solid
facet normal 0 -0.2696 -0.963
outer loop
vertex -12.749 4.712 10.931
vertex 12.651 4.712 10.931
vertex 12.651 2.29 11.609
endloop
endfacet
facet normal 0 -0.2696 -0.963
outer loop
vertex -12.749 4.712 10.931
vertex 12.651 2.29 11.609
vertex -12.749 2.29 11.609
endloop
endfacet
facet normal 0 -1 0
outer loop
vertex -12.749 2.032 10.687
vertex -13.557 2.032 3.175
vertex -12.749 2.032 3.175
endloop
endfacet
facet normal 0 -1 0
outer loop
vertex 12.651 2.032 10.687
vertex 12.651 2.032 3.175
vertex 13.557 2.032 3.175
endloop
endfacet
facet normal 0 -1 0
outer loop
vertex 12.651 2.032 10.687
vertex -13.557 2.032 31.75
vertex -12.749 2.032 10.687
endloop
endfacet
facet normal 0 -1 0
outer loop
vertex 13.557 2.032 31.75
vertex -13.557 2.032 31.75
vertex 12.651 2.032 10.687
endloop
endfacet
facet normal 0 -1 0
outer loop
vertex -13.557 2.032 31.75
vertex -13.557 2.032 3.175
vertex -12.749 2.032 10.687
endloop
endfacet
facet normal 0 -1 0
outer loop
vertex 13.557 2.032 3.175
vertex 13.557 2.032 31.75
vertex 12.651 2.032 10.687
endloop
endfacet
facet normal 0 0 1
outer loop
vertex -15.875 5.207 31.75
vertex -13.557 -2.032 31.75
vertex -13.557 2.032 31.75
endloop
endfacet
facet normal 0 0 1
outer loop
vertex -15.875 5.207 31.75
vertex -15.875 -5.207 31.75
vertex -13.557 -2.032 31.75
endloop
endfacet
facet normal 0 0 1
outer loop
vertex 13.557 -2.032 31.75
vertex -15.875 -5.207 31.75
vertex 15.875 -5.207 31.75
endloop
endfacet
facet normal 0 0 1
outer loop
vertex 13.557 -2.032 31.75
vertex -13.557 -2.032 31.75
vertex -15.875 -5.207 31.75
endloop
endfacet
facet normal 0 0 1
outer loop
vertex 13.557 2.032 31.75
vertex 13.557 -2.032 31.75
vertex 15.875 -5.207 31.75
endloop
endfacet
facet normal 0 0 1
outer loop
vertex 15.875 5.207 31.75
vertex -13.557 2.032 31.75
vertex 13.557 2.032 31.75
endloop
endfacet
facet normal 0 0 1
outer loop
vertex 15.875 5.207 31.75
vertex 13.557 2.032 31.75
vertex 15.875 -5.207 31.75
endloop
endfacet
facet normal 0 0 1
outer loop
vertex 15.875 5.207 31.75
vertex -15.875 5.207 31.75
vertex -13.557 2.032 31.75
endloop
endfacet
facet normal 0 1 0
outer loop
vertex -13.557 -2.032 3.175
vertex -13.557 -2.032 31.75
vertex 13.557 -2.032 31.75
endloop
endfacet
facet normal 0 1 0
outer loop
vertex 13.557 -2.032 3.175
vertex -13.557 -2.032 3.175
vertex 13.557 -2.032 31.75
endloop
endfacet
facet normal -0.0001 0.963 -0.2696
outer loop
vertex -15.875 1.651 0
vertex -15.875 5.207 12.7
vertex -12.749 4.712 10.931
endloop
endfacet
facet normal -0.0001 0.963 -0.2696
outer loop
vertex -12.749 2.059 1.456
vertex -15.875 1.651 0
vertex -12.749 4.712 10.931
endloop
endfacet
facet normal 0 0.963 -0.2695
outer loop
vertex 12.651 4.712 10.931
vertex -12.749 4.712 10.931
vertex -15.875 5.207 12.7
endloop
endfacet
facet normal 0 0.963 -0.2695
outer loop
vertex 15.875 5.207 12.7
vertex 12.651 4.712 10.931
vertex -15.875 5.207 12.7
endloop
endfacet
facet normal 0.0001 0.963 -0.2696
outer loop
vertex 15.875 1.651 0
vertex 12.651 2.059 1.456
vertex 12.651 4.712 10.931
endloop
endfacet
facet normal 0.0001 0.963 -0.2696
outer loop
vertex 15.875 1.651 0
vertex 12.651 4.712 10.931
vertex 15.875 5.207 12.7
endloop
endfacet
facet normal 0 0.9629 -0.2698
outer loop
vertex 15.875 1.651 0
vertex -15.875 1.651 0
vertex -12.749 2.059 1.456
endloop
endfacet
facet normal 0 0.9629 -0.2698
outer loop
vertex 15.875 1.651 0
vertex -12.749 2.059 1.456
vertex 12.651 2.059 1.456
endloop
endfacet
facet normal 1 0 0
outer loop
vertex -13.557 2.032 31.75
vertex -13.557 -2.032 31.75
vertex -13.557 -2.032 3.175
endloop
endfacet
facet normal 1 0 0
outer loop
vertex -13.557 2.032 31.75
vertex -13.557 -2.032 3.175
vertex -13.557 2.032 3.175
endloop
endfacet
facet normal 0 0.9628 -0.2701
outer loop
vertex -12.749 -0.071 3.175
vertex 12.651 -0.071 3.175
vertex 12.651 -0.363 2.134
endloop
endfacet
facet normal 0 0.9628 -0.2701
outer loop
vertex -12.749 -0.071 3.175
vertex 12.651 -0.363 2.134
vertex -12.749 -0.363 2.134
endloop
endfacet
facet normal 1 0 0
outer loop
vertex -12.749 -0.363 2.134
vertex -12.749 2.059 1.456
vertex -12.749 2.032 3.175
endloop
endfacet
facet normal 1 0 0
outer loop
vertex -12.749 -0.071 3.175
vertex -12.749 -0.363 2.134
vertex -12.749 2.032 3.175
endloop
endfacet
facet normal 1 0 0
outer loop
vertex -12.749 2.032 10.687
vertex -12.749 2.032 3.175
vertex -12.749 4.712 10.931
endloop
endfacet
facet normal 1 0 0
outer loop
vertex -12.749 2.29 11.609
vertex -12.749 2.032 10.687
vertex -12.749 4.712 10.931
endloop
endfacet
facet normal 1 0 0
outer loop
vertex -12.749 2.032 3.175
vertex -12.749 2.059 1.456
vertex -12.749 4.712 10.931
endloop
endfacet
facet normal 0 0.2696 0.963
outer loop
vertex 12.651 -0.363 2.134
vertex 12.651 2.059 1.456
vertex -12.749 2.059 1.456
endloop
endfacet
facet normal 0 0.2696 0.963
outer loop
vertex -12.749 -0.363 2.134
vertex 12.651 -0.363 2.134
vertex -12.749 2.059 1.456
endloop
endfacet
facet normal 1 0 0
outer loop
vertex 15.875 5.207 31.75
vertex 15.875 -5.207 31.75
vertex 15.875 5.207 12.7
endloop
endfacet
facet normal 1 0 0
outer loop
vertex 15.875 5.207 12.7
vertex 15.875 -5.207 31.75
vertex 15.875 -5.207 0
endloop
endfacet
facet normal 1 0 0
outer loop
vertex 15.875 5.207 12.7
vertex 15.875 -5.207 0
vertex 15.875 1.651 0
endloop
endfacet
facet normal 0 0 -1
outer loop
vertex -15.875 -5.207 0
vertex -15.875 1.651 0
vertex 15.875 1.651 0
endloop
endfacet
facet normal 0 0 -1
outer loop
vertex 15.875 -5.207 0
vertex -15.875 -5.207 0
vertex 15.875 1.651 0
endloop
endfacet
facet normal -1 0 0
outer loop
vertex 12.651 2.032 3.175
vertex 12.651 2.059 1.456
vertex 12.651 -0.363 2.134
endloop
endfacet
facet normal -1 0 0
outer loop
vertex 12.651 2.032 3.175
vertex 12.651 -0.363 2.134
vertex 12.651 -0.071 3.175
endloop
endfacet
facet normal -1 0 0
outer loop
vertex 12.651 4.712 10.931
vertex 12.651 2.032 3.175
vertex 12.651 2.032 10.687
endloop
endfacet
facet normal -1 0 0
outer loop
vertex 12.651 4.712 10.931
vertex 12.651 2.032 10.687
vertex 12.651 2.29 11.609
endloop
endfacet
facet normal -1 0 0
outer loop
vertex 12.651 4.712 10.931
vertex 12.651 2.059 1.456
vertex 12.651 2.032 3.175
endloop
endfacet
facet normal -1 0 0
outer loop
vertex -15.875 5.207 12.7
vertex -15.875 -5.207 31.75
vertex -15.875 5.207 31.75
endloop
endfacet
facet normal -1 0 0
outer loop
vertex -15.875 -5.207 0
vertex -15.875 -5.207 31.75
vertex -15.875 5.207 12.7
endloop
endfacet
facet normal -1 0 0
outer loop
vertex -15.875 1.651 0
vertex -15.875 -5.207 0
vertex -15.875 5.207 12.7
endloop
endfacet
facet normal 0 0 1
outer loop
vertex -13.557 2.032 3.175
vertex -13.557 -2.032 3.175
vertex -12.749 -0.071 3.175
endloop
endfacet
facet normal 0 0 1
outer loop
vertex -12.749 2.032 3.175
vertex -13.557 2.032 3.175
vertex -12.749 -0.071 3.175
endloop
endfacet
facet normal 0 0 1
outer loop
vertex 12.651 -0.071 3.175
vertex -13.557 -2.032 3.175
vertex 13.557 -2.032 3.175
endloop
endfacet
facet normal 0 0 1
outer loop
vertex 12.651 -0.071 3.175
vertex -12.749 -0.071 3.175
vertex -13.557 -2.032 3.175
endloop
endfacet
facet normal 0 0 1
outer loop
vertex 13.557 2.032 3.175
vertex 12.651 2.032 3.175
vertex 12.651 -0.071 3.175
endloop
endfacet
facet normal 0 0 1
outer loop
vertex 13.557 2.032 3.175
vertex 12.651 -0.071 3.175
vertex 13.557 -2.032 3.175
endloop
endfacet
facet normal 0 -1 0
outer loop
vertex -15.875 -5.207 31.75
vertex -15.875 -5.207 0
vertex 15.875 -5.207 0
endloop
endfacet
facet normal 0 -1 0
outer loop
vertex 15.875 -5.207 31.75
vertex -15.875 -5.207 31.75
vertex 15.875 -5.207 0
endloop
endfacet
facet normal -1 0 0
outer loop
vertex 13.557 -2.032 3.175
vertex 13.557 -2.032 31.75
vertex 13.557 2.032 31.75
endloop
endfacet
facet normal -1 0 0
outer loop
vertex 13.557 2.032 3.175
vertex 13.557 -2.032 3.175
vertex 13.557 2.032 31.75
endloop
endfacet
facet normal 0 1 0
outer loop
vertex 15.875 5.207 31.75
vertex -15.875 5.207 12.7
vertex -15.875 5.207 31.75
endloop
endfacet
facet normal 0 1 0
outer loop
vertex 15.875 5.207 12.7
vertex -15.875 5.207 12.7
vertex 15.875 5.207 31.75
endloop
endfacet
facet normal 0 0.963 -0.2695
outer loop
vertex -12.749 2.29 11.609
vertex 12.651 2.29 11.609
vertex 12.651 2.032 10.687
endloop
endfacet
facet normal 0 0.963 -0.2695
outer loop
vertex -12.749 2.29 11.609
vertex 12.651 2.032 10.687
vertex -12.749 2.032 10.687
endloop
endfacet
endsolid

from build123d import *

# Parameters (mm, degrees)
F0_W     = 31.75
F0_H     = 10.414
F1_DEPTH = 31.75
F2_W     = 27.1145
F2_H     = 4.064
F3_DEPTH = 28.575
F4_SIZE2 = 3.556
F4_SIZE  = 12.7
F5_W     = 25.4
F5_H     = 9.839699956
F6_DEPTH = 2.5146


with BuildPart() as f1:
    # F0 (on Top) → F1 (new body)
    with BuildSketch(Plane.XY):
        Rectangle(F0_W, F0_H)
    extrude(amount=F1_DEPTH)

    # F2 (on face) → F3 (cut)
    with BuildSketch(Plane.XY.offset(31.75)):
        Rectangle(F2_W, F2_H)
    extrude(amount=-F3_DEPTH, mode=Mode.SUBTRACT)

    # F4
    f4_edges = [f1.edges().sort_by_distance(p)[0] for p in [
        (0, 5.207, 0),
    ]]
    f4_side = f1.faces().sort_by_distance((0, 5.207, 15.875))[0]
    chamfer(f4_edges, length=F4_SIZE, length2=F4_SIZE2, reference=f4_side)

    # F5 (on face) → F6 (cut)
    with BuildSketch(Plane(origin=(0, 1.5309718101, -0.4286721068), x_dir=(-1, 0, 0), z_dir=(0, 0.9629640197, -0.2696299255))):
        with Locations((0.0492152758, 6.8765128963)):
            Rectangle(F5_W, F5_H)
    extrude(amount=-F6_DEPTH, mode=Mode.SUBTRACT)


solid = f1.part
